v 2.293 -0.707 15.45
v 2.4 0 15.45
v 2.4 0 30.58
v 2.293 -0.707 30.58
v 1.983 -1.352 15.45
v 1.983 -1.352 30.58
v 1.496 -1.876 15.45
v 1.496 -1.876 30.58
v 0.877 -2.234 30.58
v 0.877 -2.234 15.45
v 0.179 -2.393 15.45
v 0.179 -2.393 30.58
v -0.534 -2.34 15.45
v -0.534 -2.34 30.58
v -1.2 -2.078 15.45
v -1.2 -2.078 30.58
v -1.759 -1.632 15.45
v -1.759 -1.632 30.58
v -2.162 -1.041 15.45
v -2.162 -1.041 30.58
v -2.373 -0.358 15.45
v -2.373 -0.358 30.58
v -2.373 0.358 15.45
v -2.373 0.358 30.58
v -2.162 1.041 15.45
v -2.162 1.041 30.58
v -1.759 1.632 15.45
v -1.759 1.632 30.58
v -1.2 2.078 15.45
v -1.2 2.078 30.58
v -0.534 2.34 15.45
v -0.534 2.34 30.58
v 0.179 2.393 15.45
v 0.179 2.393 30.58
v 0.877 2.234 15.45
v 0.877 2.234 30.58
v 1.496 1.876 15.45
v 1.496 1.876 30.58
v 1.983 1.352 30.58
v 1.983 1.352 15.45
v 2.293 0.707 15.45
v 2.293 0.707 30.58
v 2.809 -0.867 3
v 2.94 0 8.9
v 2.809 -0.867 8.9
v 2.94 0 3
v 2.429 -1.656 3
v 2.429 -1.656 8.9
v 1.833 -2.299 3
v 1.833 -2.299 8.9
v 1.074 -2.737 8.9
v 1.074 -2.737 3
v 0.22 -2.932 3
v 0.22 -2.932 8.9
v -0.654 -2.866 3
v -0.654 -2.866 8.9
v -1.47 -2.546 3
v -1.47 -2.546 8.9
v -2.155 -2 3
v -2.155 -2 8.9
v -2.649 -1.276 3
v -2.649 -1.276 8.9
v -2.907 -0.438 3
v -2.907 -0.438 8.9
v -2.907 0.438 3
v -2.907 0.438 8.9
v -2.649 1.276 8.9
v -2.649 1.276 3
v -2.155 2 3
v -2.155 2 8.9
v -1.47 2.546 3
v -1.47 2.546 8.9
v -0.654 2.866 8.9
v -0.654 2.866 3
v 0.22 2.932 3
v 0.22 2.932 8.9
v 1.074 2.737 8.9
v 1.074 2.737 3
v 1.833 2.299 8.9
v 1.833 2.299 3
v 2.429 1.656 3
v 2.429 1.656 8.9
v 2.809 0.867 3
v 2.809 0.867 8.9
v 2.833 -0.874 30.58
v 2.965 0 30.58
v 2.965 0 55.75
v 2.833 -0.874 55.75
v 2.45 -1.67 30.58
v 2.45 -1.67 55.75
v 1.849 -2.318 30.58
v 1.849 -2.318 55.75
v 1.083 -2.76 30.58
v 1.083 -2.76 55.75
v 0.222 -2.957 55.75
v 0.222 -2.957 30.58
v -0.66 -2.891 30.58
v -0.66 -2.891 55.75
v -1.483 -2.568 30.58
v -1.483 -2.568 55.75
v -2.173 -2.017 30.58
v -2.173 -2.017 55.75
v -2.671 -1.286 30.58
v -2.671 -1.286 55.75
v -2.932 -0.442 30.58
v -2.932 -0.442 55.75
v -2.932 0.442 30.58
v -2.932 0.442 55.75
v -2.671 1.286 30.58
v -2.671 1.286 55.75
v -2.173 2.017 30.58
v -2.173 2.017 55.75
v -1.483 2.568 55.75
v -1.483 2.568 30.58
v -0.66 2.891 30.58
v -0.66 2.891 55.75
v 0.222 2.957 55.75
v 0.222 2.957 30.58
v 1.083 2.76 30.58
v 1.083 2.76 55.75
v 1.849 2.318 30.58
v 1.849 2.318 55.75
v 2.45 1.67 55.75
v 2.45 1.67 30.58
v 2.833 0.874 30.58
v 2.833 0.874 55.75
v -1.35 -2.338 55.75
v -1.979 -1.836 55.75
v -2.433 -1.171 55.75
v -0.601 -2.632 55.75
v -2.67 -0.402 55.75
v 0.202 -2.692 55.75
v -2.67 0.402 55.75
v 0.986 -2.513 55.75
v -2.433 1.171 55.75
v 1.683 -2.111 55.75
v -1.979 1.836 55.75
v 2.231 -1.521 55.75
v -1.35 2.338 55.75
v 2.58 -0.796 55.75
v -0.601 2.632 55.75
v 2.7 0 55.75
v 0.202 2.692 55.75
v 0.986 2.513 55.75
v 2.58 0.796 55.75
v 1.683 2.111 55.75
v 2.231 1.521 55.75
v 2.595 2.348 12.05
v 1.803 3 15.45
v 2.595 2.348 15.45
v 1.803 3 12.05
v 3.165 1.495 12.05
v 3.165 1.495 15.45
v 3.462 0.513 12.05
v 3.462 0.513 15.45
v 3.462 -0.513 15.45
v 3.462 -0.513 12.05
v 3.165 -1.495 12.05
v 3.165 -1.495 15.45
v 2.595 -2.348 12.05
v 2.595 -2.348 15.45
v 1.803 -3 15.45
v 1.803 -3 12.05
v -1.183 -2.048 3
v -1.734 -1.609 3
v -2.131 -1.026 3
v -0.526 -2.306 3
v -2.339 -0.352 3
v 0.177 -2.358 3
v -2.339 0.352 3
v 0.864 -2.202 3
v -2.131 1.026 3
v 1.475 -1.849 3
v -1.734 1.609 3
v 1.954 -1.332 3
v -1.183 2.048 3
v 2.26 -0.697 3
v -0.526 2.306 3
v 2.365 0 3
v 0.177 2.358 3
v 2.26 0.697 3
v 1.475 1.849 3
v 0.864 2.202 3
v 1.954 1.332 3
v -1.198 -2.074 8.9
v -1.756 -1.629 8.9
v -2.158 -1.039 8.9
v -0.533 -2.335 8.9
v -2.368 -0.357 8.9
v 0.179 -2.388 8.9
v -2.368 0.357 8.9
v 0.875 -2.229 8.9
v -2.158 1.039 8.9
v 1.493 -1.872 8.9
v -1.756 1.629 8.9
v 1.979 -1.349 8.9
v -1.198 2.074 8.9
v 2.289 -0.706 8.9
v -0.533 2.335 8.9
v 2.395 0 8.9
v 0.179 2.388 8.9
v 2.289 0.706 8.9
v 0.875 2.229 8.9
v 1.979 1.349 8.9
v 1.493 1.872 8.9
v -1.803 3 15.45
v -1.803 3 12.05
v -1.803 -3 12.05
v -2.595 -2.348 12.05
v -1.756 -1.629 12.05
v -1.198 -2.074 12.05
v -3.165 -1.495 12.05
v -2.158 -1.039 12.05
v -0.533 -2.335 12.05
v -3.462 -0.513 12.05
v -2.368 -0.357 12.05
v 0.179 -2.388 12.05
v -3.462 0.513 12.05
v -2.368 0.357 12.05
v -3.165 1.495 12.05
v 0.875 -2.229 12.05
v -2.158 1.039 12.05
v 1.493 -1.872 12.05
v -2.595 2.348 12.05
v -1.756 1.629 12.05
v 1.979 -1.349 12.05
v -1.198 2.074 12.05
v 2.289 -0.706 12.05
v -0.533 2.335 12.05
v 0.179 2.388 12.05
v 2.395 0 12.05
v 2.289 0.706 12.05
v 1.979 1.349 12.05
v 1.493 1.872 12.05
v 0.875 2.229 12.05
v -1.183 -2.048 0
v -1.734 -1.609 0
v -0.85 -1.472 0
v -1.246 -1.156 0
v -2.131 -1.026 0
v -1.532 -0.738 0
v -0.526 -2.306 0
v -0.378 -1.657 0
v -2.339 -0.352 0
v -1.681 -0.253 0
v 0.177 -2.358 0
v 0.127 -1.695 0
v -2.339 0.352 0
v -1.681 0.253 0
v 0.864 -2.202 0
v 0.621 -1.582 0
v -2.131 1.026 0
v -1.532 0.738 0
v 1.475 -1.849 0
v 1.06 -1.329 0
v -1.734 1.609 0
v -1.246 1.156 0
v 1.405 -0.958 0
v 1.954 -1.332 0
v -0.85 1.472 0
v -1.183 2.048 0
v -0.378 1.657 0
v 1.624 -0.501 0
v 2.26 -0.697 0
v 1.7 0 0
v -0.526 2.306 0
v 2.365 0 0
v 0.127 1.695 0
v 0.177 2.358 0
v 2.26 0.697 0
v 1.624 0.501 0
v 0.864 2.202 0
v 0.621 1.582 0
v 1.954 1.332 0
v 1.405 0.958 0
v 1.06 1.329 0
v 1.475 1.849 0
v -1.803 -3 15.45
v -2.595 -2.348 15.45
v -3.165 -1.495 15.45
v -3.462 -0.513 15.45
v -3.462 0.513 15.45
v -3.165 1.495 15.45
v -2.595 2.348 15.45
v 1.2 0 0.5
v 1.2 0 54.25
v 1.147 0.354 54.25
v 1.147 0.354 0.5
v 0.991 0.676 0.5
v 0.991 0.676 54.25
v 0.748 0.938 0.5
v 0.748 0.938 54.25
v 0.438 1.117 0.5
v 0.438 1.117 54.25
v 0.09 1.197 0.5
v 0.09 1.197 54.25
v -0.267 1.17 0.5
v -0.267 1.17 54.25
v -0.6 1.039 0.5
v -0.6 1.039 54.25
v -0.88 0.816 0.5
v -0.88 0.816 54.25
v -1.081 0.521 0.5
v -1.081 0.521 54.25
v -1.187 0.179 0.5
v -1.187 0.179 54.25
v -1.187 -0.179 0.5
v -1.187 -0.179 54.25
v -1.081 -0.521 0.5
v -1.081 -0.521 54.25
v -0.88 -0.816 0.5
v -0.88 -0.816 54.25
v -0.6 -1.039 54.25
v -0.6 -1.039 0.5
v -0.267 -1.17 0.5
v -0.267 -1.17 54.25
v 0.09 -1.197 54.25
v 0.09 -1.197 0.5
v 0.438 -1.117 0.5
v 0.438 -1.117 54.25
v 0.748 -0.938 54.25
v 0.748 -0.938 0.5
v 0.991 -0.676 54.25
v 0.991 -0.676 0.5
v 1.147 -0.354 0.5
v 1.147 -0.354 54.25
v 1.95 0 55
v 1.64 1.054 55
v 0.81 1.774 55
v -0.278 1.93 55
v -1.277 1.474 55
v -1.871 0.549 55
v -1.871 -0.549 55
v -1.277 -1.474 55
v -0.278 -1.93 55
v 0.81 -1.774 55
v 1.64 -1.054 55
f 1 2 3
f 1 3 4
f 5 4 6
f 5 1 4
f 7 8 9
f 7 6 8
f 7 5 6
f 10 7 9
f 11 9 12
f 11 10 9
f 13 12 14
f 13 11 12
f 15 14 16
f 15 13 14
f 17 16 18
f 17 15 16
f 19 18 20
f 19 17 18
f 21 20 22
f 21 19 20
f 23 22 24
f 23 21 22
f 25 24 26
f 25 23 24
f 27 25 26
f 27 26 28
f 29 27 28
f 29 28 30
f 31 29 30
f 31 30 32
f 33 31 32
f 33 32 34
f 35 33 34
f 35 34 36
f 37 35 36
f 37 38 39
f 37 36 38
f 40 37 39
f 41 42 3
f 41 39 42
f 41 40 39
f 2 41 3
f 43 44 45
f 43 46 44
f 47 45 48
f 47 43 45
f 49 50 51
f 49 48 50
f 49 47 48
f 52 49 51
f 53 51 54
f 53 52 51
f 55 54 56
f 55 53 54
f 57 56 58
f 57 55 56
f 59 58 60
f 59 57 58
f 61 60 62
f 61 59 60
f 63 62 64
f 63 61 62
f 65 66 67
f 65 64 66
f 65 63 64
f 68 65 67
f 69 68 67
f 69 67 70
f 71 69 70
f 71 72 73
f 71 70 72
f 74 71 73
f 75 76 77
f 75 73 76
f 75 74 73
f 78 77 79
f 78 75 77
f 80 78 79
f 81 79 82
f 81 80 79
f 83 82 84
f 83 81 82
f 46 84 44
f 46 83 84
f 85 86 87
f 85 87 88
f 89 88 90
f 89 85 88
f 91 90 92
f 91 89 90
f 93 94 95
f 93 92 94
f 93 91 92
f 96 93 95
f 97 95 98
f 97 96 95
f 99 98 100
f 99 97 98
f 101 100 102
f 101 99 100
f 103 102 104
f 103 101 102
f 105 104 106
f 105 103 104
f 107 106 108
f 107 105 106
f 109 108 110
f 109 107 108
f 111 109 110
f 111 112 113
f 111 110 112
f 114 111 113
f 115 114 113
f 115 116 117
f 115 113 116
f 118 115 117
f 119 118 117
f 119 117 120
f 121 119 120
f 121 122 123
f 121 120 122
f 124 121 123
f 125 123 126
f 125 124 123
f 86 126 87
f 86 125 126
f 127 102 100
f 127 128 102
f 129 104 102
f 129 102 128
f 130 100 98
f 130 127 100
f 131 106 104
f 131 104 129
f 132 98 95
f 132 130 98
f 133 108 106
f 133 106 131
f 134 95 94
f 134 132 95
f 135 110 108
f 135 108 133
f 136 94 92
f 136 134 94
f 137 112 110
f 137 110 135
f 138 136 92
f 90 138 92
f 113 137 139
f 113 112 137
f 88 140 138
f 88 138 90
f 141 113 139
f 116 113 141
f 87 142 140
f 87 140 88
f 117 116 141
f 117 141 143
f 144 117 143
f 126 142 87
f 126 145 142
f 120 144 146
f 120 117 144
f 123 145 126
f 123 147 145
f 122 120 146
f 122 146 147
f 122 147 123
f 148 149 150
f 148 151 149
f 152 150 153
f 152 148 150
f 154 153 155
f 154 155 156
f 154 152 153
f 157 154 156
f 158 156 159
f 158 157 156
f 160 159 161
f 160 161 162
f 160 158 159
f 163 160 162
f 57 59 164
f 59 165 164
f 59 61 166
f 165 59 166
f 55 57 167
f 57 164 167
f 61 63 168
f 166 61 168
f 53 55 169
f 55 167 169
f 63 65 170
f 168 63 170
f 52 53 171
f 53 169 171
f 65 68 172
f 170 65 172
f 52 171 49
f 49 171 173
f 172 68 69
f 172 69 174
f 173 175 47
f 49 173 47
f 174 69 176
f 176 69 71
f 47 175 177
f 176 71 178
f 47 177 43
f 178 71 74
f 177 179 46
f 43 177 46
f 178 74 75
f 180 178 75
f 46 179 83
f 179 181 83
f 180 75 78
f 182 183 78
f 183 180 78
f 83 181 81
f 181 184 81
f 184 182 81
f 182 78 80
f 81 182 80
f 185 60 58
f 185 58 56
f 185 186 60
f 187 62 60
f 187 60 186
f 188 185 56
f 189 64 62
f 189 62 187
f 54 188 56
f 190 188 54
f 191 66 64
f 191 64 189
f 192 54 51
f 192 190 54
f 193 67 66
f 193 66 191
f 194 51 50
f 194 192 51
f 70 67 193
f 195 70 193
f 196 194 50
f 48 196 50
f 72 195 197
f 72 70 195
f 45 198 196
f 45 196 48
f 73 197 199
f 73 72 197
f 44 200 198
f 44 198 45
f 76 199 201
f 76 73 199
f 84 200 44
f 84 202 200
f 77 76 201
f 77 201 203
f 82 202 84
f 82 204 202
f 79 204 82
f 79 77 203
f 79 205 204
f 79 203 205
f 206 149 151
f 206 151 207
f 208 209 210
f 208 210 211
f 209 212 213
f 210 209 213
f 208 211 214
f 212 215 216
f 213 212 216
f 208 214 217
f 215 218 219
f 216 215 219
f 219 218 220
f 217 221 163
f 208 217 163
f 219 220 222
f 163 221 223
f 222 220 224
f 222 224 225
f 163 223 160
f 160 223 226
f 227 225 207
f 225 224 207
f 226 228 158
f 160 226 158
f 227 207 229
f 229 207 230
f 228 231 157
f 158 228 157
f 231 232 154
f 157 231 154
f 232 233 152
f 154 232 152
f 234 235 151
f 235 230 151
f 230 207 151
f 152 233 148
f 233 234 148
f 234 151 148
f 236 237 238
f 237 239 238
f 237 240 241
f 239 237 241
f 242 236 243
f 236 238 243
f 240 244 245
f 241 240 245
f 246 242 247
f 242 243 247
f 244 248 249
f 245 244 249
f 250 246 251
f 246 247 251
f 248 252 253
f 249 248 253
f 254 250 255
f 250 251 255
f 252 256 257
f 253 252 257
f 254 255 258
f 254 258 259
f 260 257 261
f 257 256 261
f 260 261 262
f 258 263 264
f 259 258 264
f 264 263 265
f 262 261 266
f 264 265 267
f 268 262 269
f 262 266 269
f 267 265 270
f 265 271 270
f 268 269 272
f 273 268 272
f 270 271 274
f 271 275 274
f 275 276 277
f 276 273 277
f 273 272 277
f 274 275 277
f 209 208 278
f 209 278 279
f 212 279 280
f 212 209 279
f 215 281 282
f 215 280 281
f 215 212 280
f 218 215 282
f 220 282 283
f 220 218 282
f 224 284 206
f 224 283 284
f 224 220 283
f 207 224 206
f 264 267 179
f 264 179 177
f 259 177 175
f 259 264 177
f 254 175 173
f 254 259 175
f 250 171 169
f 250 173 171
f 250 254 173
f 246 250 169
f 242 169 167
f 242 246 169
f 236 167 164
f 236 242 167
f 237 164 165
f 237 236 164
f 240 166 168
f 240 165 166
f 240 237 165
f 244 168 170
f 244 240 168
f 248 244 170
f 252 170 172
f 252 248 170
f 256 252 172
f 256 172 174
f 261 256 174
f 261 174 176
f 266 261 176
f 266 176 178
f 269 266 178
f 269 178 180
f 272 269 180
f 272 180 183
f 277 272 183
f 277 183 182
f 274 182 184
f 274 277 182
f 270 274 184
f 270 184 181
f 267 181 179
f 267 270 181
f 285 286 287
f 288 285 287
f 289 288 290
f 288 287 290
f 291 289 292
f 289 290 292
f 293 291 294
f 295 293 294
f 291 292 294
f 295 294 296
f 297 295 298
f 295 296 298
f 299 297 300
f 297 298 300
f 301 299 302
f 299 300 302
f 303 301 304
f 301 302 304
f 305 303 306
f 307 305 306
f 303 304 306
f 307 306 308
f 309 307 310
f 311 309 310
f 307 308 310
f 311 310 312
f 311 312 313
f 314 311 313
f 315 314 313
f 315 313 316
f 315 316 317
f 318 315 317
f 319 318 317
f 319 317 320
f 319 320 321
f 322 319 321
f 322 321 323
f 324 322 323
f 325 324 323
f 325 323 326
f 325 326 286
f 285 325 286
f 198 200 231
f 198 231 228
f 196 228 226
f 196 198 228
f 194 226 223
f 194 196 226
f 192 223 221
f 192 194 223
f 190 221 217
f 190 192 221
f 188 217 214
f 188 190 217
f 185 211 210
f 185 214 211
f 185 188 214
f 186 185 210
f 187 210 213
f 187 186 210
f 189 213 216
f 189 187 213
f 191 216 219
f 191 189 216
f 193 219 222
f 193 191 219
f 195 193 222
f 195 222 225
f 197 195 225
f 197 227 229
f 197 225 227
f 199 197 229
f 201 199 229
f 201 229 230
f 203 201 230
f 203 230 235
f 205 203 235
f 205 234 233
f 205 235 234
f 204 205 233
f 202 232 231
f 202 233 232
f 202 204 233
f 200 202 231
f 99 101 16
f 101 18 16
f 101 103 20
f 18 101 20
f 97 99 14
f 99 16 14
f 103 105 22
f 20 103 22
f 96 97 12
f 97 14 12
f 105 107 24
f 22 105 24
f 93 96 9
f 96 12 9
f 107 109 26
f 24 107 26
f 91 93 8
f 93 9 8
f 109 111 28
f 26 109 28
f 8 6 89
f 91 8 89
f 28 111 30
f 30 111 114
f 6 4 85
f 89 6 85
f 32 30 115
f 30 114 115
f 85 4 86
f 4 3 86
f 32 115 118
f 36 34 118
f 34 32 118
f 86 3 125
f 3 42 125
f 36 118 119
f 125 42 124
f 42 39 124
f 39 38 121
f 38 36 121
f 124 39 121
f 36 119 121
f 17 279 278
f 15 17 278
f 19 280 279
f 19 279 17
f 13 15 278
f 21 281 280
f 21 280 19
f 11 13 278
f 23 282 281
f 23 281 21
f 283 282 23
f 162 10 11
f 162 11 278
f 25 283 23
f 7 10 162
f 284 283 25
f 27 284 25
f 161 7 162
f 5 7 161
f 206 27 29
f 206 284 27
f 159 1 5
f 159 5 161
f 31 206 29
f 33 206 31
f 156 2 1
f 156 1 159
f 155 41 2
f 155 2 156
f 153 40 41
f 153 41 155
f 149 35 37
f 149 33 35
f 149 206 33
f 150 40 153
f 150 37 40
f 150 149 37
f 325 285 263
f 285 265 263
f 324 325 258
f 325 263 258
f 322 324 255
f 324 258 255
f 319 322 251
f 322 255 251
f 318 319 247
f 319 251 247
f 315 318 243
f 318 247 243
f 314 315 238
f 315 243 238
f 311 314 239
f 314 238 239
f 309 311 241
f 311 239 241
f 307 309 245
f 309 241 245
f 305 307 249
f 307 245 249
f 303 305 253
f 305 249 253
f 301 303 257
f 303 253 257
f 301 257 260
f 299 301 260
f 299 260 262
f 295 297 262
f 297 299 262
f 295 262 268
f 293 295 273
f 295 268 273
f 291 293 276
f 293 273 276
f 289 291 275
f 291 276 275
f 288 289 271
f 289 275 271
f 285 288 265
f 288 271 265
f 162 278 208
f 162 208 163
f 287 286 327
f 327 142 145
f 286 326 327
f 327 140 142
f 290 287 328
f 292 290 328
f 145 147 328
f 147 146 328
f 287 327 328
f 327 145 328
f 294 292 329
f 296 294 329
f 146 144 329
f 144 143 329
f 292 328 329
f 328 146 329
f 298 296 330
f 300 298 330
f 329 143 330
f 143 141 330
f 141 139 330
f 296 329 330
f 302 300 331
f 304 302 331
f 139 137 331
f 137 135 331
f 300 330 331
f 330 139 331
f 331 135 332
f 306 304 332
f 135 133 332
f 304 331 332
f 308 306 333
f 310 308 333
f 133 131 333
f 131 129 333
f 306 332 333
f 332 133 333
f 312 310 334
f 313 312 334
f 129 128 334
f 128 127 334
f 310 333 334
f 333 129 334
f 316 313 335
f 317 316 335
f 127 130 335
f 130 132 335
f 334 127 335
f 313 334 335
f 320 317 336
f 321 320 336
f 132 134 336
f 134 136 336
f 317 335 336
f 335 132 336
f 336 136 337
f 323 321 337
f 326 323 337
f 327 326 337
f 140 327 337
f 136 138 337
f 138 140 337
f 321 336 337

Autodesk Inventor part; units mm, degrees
ref_plane "YZ Plane" through (0, 0, 0) normal (1, 0, 0) x (0, 1, 0)
ref_plane "XZ Plane" through (0, 0, 0) normal (0, 1, 0) x (-1, 0, 0)
ref_plane "XY Plane" through (0, 0, 0) normal (0, 0, 1) x (1, 0, 0)
sketch "Sketch1" plane through (0, 0, 0) normal (0, 0, 1) x (1, 0, 0)
  circle A0 centre (0, 0) radius 2.365
  dimension "d0" = 4.73
extrude "Extrusion1" add sketch "Sketch1" along normal blind 3
sketch "Sketch2" plane through (0, 0, 3) normal (0, 0, 1) x (1, 0, 0)
  circle A0 centre (0, 0) radius 2.94
  dimension "d3" = 5.88
extrude "Extrusion2" add sketch "Sketch2" along normal blind 5.9
thread "Thread1" size "M6x1" class "6g" standard "ANSI Metric M Profile" full length
sketch "Sketch3" plane through (0, 0, 8.9) normal (0, 0, 1) x (1, 0, 0)
  circle A0 centre (0, 0) radius 2.94 projected
  circle A1 centre (0, 0) radius 2.395
  dimension "d8" = 4.79
extrude "Extrusion3" add sketch "Sketch3" along normal blind 3.15 contours A1
sketch "Sketch4" plane through (0, 0, 12.05) normal (0, 0, 1) x (1, 0, 0)
  circle A0 centre (0, 0) radius 3.5
  dimension "d11" = 7
extrude "Extrusion4" add sketch "Sketch4" along normal blind 3.4
sketch "Sketch5" plane through (0, 0, 15.45) normal (0, 0, 1) x (1, 0, 0)
  line L0 (-1.8028, -3) -> (1.8028, -3)
  line L1 (9.1237, -3) -> (9.1237, 3)
  line L2 (1.8028, 3) -> (-1.8028, 3)
  line L3 (-9.1237, 3) -> (-9.1237, -3)
  line L4 (-9.1237, -3) -> (9.1237, 3) construction
  line L5 (9.1237, -3) -> (-9.1237, 3) construction
  circle A0 centre (0, 0) radius 3.5 projected
  dimension "d14" = 6
extrude "Extrusion5" cut sketch "Sketch5" against normal blind 3.4 contours L0 A0 | A0 L2
sketch "Sketch6" plane through (0, 0, 15.45) normal (0, 0, 1) x (1, 0, 0)
  circle A0 centre (0, 0) radius 2.4
  dimension "d17" = 4.8
extrude "Extrusion6" add sketch "Sketch6" along normal blind 15.13
sketch "Sketch7" plane through (0, 0, 30.58) normal (0, 0, 1) x (1, 0, 0)
  circle A0 centre (0, 0) radius 2.965
  dimension "d20" = 5.93
extrude "Extrusion7" add sketch "Sketch7" along normal blind 25.17
thread "Thread2" size "M6x1" class "6g" standard "ANSI Metric M Profile" full length
sketch "Sketch8" plane through (0, 0, 55.75) normal (0, 0, 1) x (1, 0, 0)
  circle A0 centre (0, 0) radius 1.2
  dimension "d25" = 2.4
extrude "Extrusion8" cut sketch "Sketch8" against normal through all
chamfer "Chamfer1" distance 1.5 angle 45 1 edges at (-1.2, 0, 55.75)
chamfer "Chamfer2" distance 0.5 angle 45 1 edges at (-1.2, 0, 0)
properties part number "feeder tube" material "Stainless Steel"
